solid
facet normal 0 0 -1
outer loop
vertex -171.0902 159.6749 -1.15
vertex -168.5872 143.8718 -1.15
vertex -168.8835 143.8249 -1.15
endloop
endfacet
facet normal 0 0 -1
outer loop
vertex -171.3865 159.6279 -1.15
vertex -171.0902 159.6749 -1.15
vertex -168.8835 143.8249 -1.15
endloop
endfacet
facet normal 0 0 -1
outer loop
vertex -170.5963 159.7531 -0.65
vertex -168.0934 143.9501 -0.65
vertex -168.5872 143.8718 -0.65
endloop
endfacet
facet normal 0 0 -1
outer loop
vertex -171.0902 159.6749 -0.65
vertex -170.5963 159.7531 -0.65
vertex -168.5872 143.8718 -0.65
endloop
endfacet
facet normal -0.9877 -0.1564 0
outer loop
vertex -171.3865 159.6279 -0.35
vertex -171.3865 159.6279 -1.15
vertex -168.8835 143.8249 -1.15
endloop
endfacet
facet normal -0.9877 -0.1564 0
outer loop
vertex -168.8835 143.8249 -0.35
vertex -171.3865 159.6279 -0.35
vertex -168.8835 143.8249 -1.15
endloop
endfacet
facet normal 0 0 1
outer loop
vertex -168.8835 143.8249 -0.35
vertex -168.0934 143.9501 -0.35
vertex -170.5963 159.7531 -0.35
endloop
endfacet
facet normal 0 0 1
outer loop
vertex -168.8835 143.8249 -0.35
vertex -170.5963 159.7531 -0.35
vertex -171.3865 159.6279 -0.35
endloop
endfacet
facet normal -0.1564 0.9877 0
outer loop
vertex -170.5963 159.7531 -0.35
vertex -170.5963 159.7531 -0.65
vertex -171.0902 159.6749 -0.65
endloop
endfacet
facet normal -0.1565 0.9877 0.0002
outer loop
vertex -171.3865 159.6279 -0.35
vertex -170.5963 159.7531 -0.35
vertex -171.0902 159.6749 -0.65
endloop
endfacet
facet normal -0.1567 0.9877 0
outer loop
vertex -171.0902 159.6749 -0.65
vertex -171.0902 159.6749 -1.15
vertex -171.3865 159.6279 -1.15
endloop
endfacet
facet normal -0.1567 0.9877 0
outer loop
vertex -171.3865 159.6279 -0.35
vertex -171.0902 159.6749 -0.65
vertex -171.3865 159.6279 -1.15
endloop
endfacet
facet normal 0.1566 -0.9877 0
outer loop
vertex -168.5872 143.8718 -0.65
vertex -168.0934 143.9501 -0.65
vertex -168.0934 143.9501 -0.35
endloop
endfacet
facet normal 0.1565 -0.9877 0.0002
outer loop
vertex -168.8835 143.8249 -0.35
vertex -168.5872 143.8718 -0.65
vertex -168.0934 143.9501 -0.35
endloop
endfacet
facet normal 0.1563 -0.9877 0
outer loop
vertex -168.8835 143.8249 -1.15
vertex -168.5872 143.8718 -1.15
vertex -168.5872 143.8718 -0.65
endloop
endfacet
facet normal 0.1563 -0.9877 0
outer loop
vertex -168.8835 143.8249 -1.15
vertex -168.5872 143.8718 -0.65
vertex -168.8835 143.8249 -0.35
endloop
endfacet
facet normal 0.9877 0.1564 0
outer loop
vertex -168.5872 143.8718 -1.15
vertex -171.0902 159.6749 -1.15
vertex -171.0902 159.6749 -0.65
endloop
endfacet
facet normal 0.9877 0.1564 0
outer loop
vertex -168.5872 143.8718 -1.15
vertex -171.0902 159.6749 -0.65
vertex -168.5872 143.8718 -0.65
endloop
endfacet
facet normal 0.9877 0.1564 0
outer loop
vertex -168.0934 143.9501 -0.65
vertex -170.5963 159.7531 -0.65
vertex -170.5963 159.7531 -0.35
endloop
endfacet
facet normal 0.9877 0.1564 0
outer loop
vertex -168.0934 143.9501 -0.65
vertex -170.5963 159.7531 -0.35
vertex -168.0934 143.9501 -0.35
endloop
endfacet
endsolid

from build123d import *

# Parameters (mm, degrees)
BOX173_W               = 0.8
BOX173_H               = 16
BOX173_DEPTH           = 0.8
BOX174_W               = 0.8
BOX174_H               = 16
BOX174_DEPTH           = 0.8
CUT090_PLACEMENT_ANGLE = 189


with BuildPart() as cubo173:
    # Box173 → Box173 (new body)
    with BuildSketch(Plane.XY):
        with Locations((0.4, 8)):
            Rectangle(BOX173_W, BOX173_H)
    extrude(amount=BOX173_DEPTH)


with BuildPart() as perfil_l_2da_cara032:
    # Box174 → Box174 (new body)
    with BuildSketch(Plane(origin=(0.3, 0, 0.3), x_dir=(1, 0, 0), z_dir=(0, 0, 1))):
        with Locations((0.4, 8)):
            Rectangle(BOX174_W, BOX174_H)
    extrude(amount=BOX174_DEPTH)

    # Cut090: cut Cubo173
    add(cubo173.part, mode=Mode.SUBTRACT)


with BuildPart() as perfil_l_2da_cara032_1:
    # Cut090 placement: moved
    add(perfil_l_2da_cara032.part.moved(Location((-170.3, 159.8, -1.45))).rotate(Axis((-170.3, 159.8, -1.45), (0, 0, 1)), CUT090_PLACEMENT_ANGLE))


solid = perfil_l_2da_cara032_1.part
